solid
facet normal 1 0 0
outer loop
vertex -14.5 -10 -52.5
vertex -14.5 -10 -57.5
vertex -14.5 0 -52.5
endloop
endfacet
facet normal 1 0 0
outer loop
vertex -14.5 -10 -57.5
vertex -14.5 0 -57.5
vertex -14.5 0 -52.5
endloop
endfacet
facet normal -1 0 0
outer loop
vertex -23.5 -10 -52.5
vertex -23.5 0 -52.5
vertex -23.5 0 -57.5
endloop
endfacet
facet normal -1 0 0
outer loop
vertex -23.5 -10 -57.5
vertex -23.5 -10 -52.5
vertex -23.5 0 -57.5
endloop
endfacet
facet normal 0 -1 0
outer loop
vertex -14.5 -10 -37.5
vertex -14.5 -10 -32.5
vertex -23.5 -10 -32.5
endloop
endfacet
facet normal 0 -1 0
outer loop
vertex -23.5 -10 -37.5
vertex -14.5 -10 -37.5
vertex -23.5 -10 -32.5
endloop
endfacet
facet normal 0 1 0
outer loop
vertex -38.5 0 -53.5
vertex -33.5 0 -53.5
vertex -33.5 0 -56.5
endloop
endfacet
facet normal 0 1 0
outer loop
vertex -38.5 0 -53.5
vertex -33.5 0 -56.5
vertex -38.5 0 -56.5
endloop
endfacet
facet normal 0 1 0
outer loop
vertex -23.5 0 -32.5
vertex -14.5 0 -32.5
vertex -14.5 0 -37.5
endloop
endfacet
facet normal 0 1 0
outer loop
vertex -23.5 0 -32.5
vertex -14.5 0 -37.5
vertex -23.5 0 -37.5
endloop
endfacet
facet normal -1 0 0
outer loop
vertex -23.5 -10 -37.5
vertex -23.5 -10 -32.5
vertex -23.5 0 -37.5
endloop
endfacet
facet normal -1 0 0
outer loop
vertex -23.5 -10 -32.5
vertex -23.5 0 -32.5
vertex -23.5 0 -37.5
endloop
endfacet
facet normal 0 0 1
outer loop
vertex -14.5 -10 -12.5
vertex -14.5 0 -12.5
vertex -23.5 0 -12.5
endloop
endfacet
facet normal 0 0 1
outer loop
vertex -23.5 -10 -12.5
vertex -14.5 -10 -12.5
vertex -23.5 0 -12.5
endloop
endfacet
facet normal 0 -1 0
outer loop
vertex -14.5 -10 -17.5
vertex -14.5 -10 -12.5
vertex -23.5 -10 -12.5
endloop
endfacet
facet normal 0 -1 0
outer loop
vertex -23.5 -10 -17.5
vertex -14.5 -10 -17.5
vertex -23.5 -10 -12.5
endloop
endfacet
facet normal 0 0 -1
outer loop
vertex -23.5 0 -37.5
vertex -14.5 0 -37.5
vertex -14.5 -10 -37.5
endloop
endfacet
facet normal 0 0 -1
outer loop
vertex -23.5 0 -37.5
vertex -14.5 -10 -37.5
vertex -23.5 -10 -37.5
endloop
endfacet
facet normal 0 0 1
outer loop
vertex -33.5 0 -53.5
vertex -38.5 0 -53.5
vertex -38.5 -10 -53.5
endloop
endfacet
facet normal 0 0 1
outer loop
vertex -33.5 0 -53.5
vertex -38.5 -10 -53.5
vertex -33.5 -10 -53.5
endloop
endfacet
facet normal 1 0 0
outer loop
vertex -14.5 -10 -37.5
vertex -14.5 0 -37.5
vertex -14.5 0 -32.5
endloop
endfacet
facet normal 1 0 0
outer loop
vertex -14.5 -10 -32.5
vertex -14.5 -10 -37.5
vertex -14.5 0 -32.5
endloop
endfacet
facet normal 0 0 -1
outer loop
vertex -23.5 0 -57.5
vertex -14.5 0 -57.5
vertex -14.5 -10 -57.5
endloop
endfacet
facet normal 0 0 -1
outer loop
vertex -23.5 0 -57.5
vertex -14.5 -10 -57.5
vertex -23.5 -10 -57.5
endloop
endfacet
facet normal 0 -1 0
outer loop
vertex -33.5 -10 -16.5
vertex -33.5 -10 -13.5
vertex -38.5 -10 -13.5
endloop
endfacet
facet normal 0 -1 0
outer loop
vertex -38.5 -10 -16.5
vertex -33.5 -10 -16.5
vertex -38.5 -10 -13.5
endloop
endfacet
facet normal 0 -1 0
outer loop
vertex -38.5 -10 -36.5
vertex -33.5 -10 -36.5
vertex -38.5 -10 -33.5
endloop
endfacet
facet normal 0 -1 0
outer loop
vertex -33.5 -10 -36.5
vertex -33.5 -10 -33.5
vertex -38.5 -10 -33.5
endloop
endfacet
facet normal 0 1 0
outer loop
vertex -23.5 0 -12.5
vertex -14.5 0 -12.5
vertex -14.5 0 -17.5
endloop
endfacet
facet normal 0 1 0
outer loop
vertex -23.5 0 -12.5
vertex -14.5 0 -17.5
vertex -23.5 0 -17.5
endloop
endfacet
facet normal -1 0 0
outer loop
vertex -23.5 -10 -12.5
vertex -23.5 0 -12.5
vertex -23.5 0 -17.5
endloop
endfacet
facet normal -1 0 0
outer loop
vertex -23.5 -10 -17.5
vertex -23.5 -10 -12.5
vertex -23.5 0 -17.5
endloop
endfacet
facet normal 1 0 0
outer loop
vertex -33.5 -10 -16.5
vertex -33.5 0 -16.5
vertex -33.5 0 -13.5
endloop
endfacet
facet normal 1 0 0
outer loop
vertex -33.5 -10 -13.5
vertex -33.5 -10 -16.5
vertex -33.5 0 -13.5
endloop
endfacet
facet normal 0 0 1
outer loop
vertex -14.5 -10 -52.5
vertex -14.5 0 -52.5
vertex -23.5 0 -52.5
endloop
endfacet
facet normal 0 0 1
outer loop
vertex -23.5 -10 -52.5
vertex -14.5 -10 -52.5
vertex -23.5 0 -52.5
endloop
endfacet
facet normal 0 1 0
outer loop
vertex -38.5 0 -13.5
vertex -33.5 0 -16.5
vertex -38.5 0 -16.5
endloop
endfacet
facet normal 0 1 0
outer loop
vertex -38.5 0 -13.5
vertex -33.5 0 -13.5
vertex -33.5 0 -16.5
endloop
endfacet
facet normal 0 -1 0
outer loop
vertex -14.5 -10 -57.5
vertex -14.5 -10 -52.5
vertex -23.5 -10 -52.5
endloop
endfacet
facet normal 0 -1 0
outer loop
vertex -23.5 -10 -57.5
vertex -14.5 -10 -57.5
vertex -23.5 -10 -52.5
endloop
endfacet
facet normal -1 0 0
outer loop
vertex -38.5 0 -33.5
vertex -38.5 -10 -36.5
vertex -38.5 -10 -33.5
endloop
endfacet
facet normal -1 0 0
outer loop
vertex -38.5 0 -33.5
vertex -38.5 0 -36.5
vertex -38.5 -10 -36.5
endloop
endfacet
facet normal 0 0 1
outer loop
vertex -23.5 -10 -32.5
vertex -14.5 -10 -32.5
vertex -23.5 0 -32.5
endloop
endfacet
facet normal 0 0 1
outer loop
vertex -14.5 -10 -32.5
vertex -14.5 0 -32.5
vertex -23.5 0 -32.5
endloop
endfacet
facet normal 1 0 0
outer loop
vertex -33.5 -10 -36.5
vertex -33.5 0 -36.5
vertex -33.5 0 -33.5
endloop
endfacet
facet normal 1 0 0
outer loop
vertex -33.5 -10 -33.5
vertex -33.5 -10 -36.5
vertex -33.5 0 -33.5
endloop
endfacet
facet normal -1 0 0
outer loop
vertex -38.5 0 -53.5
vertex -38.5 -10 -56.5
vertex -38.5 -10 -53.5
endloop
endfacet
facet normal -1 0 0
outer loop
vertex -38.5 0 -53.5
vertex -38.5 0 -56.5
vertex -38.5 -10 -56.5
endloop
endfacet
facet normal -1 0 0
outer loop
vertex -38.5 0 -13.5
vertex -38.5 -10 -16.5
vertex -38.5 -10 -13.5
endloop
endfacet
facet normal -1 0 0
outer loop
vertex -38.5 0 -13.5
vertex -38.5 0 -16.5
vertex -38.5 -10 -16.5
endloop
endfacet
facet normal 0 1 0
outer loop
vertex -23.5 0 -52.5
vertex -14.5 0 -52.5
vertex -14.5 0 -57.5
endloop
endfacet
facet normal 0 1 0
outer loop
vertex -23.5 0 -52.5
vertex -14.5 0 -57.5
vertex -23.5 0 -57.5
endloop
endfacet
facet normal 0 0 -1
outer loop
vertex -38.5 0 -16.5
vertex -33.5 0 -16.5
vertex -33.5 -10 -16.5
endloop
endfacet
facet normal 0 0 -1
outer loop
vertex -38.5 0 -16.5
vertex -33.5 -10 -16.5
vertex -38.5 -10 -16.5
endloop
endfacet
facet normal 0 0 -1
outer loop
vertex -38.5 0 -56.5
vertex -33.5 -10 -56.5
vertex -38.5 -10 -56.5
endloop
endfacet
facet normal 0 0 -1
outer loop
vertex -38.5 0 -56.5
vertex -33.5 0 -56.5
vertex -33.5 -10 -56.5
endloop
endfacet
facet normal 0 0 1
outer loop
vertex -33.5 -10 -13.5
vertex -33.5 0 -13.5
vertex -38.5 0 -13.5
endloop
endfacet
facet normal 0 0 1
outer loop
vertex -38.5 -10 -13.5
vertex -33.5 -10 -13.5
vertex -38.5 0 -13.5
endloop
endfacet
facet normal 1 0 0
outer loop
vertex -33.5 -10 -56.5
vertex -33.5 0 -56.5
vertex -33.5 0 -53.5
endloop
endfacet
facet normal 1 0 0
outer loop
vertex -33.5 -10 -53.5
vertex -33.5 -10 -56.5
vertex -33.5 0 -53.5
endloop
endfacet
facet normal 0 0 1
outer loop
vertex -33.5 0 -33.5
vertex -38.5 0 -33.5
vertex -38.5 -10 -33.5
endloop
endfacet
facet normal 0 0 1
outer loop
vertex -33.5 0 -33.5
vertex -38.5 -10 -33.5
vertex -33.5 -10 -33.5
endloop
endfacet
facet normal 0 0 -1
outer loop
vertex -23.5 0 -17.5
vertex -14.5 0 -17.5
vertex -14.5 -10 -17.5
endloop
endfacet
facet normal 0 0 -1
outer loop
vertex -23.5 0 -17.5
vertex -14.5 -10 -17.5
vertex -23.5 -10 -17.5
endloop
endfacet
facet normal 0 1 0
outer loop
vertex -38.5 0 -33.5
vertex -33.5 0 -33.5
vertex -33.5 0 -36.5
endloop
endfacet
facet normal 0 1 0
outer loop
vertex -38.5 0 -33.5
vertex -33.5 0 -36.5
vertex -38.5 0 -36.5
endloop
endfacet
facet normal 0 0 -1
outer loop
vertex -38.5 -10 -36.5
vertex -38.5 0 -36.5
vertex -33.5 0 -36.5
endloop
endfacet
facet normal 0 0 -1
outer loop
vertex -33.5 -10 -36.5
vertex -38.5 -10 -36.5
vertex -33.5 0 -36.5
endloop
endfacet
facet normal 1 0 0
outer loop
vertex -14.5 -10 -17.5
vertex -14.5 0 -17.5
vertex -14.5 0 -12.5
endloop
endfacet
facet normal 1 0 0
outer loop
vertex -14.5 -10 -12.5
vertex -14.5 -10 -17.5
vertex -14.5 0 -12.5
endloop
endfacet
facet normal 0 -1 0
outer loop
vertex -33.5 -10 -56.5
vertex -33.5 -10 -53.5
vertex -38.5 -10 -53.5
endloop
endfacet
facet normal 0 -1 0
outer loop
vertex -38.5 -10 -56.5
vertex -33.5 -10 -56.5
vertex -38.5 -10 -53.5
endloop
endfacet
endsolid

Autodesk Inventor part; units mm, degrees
ref_plane "YZ Plane" through (0, 0, 0) normal (1, 0, 0) x (0, 1, 0)
ref_plane "XZ Plane" through (0, 0, 0) normal (0, 1, 0) x (-1, 0, 0)
ref_plane "XY Plane" through (0, 0, 0) normal (0, 0, 1) x (1, 0, 0)
sketch "Sketch1" plane through (0, 0, 0) normal (0, 1, 0) x (-1, 0, 0)
  line L0 (100, 0) -> (0, 0)
  line L1 (0, 0) -> (0, -80)
  line L2 (0, -80) -> (100, -80)
  line L3 (100, -80) -> (100, 0)
  line L4 (95, -5) -> (68, -5)
  line L5 (5, -5) -> (5, -75)
  line L6 (5, -75) -> (95, -75)
  line L7 (95, -75) -> (95, -5)
  line L8 (33.5, -10) -> (23.5, -10)
  line L9 (23.5, -10) -> (23.5, -20)
  line L10 (23.5, -20) -> (33.5, -20)
  line L11 (95, -65) -> (95, -5)
  line L12 (23.5, -50) -> (23.5, -60)
  line L13 (23.5, -60) -> (33.5, -60)
  line L14 (33.5, -50) -> (23.5, -50)
  line L15 (95, -5) -> (90, -5)
  line L16 (90, -5) -> (90, -10)
  line L17 (90, -10) -> (95, -10)
  line L18 (95, -10) -> (95, -5)
  line L19 (95, -75) -> (90, -75)
  line L20 (90, -75) -> (90, -70)
  line L21 (90, -70) -> (95, -70)
  line L22 (95, -70) -> (95, -75)
  line L23 (5, -5) -> (10, -5)
  line L24 (10, -5) -> (10, -10)
  line L25 (10, -10) -> (5, -10)
  line L26 (5, -10) -> (5, -5)
  line L27 (5, -75) -> (10, -75)
  line L28 (10, -75) -> (10, -70)
  line L29 (10, -70) -> (5, -70)
  line L30 (5, -70) -> (5, -75)
  line L31 (95, -5) -> (68, -5)
  line L32 (14.5, -63) -> (14.5, -5)
  line L33 (38.5, -63) -> (14.5, -63)
  line L34 (14.5, -5) -> (5, -5)
  line L35 (23.5, -40) -> (33.5, -40)
  line L36 (23.5, -30) -> (23.5, -40)
  line L37 (33.5, -30) -> (23.5, -30)
  line L38 (33.5, -60) -> (33.5, -56.5)
  line L39 (33.5, -53.5) -> (33.5, -50)
  line L40 (38.5, -56.5) -> (38.5, -63)
  line L41 (33.5, -56.5) -> (38.5, -56.5)
  line L42 (38.5, -53.5) -> (33.5, -53.5)
  line L43 (33.5, -40) -> (33.5, -36.5)
  line L44 (33.5, -33.5) -> (33.5, -30)
  line L45 (38.5, -36.5) -> (38.5, -53.5)
  line L46 (33.5, -20) -> (33.5, -16.5)
  line L47 (33.5, -13.5) -> (33.5, -10)
  line L48 (38.5, -5) -> (38.5, -13.5)
  line L49 (38.5, -16.5) -> (38.5, -33.5)
  line L50 (38.5, -36.5) -> (33.5, -36.5)
  line L51 (38.5, -33.5) -> (33.5, -33.5)
  line L52 (33.5, -16.5) -> (38.5, -16.5)
  line L53 (33.5, -13.5) -> (38.5, -13.5)
  line L54 (33.5, -56.5) -> (33.5, -53.5)
  line L55 (38.5, -56.5) -> (38.5, -53.5)
  line L56 (38.5, -36.5) -> (38.5, -33.5)
  line L57 (33.5, -36.5) -> (33.5, -33.5)
  line L58 (33.5, -16.5) -> (33.5, -13.5)
  line L59 (38.5, -16.5) -> (38.5, -13.5)
  line L60 (14.5, -57.5) -> (23.5, -57.5)
  line L61 (14.5, -52.5) -> (23.5, -52.5)
  line L62 (14.5, -37.5) -> (23.5, -37.5)
  line L63 (14.5, -32.5) -> (23.5, -32.5)
  line L64 (14.5, -17.5) -> (23.5, -17.5)
  line L65 (14.5, -12.5) -> (23.5, -12.5)
  line L66 (40, -5) -> (40, -63)
  line L67 (68, -5) -> (43, -5)
  line L68 (40, -5) -> (38.5, -5)
  line L69 (37, -75) -> (37, -72)
  line L70 (40, -5) -> (43, -5)
  line L71 (13, -5) -> (13, -72)
  line L72 (13, -72) -> (14.5, -72)
  line L73 (14.5, -72) -> (14.5, -75)
  line L74 (2.5002, -77.5) -> (2.5002, -2.5)
  line L75 (2.5002, -2.5) -> (97.5, -2.5)
  line L76 (97.5, -2.5) -> (97.5, -77.5)
  line L77 (97.5, -77.5) -> (2.5002, -77.5)
  line L78 (40, -63) -> (43, -63)
  line L79 (43, -75) -> (43, -72)
  line L80 (43, -63) -> (43, -5)
  line L81 (43, -72) -> (37, -72)
  line L82 (13.5, -5) -> (13.5, -65)
  line L83 (13.5, -65) -> (43.5, -65)
  line L84 (43.5, -65) -> (43.5, -5)
  line L85 (14.5, -5) -> (38.5, -5)
  line L86 (10, -75) -> (10, -5)
  dimension "d0" = 5
  dimension "d1" = 5
  dimension "d2" = 5
  dimension "d4" = 10
  dimension "d5" = 10
  dimension "d6" = 10
  dimension "d7" = 10
  dimension "d8" = 70
  dimension "d9" = 5
  dimension "d10" = 5
  dimension "d11" = 5
  dimension "d12" = 5
  dimension "d13" = 5
  dimension "d14" = 5
  dimension "d15" = 5
  dimension "d16" = 5
  dimension "d19" = 90
  dimension "d20" = 9.5
  dimension "d21" = 3
  dimension "d22" = 10
  dimension "d23" = 80
  dimension "d24" = 10
  dimension "d25" = 10
  dimension "d26" = 10
  dimension "d27" = 10
  dimension "d30" = 6.5
  dimension "d47" = 17
  dimension "d54" = 5
  dimension "d55" = 2.5
  dimension "d56" = 5
  dimension "d57" = 2.5
  dimension "d58" = 5
  dimension "d59" = 2.5
  dimension "d60" = 1.5
  dimension "d61" = 9
  dimension "d62" = 58
  dimension "d63" = 1.5
  dimension "d65" = 3
  dimension "d67" = 2.5002
  dimension "d68" = 2.5
  dimension "d69" = 2.5
  dimension "d70" = 2.5
  dimension "d71" = 3
  dimension "d72" = 6
  dimension "d73" = 3
  dimension "d74" = 2.5
  dimension "d75" = 24
  dimension "d76" = 3
  dimension "d77" = 3
  dimension "d78" = 3
  dimension "d79" = 17
  dimension "d88" = 10
  dimension "d90" = 10
  dimension "d91" = 5
extrude "Extrusion5" [suppressed]
extrude "Extrusion6" [suppressed]
extrude "Extrusion7" add sketch "Sketch1" against normal blind 10 contours L59 L52 L58 L53 | L65 L9 L64 L32 | L56 L50 L57 L51 | L63 L36 L62 L32 | L55 L41 L54 L42 | L61 L12 L60 L32
properties part number "Top"
